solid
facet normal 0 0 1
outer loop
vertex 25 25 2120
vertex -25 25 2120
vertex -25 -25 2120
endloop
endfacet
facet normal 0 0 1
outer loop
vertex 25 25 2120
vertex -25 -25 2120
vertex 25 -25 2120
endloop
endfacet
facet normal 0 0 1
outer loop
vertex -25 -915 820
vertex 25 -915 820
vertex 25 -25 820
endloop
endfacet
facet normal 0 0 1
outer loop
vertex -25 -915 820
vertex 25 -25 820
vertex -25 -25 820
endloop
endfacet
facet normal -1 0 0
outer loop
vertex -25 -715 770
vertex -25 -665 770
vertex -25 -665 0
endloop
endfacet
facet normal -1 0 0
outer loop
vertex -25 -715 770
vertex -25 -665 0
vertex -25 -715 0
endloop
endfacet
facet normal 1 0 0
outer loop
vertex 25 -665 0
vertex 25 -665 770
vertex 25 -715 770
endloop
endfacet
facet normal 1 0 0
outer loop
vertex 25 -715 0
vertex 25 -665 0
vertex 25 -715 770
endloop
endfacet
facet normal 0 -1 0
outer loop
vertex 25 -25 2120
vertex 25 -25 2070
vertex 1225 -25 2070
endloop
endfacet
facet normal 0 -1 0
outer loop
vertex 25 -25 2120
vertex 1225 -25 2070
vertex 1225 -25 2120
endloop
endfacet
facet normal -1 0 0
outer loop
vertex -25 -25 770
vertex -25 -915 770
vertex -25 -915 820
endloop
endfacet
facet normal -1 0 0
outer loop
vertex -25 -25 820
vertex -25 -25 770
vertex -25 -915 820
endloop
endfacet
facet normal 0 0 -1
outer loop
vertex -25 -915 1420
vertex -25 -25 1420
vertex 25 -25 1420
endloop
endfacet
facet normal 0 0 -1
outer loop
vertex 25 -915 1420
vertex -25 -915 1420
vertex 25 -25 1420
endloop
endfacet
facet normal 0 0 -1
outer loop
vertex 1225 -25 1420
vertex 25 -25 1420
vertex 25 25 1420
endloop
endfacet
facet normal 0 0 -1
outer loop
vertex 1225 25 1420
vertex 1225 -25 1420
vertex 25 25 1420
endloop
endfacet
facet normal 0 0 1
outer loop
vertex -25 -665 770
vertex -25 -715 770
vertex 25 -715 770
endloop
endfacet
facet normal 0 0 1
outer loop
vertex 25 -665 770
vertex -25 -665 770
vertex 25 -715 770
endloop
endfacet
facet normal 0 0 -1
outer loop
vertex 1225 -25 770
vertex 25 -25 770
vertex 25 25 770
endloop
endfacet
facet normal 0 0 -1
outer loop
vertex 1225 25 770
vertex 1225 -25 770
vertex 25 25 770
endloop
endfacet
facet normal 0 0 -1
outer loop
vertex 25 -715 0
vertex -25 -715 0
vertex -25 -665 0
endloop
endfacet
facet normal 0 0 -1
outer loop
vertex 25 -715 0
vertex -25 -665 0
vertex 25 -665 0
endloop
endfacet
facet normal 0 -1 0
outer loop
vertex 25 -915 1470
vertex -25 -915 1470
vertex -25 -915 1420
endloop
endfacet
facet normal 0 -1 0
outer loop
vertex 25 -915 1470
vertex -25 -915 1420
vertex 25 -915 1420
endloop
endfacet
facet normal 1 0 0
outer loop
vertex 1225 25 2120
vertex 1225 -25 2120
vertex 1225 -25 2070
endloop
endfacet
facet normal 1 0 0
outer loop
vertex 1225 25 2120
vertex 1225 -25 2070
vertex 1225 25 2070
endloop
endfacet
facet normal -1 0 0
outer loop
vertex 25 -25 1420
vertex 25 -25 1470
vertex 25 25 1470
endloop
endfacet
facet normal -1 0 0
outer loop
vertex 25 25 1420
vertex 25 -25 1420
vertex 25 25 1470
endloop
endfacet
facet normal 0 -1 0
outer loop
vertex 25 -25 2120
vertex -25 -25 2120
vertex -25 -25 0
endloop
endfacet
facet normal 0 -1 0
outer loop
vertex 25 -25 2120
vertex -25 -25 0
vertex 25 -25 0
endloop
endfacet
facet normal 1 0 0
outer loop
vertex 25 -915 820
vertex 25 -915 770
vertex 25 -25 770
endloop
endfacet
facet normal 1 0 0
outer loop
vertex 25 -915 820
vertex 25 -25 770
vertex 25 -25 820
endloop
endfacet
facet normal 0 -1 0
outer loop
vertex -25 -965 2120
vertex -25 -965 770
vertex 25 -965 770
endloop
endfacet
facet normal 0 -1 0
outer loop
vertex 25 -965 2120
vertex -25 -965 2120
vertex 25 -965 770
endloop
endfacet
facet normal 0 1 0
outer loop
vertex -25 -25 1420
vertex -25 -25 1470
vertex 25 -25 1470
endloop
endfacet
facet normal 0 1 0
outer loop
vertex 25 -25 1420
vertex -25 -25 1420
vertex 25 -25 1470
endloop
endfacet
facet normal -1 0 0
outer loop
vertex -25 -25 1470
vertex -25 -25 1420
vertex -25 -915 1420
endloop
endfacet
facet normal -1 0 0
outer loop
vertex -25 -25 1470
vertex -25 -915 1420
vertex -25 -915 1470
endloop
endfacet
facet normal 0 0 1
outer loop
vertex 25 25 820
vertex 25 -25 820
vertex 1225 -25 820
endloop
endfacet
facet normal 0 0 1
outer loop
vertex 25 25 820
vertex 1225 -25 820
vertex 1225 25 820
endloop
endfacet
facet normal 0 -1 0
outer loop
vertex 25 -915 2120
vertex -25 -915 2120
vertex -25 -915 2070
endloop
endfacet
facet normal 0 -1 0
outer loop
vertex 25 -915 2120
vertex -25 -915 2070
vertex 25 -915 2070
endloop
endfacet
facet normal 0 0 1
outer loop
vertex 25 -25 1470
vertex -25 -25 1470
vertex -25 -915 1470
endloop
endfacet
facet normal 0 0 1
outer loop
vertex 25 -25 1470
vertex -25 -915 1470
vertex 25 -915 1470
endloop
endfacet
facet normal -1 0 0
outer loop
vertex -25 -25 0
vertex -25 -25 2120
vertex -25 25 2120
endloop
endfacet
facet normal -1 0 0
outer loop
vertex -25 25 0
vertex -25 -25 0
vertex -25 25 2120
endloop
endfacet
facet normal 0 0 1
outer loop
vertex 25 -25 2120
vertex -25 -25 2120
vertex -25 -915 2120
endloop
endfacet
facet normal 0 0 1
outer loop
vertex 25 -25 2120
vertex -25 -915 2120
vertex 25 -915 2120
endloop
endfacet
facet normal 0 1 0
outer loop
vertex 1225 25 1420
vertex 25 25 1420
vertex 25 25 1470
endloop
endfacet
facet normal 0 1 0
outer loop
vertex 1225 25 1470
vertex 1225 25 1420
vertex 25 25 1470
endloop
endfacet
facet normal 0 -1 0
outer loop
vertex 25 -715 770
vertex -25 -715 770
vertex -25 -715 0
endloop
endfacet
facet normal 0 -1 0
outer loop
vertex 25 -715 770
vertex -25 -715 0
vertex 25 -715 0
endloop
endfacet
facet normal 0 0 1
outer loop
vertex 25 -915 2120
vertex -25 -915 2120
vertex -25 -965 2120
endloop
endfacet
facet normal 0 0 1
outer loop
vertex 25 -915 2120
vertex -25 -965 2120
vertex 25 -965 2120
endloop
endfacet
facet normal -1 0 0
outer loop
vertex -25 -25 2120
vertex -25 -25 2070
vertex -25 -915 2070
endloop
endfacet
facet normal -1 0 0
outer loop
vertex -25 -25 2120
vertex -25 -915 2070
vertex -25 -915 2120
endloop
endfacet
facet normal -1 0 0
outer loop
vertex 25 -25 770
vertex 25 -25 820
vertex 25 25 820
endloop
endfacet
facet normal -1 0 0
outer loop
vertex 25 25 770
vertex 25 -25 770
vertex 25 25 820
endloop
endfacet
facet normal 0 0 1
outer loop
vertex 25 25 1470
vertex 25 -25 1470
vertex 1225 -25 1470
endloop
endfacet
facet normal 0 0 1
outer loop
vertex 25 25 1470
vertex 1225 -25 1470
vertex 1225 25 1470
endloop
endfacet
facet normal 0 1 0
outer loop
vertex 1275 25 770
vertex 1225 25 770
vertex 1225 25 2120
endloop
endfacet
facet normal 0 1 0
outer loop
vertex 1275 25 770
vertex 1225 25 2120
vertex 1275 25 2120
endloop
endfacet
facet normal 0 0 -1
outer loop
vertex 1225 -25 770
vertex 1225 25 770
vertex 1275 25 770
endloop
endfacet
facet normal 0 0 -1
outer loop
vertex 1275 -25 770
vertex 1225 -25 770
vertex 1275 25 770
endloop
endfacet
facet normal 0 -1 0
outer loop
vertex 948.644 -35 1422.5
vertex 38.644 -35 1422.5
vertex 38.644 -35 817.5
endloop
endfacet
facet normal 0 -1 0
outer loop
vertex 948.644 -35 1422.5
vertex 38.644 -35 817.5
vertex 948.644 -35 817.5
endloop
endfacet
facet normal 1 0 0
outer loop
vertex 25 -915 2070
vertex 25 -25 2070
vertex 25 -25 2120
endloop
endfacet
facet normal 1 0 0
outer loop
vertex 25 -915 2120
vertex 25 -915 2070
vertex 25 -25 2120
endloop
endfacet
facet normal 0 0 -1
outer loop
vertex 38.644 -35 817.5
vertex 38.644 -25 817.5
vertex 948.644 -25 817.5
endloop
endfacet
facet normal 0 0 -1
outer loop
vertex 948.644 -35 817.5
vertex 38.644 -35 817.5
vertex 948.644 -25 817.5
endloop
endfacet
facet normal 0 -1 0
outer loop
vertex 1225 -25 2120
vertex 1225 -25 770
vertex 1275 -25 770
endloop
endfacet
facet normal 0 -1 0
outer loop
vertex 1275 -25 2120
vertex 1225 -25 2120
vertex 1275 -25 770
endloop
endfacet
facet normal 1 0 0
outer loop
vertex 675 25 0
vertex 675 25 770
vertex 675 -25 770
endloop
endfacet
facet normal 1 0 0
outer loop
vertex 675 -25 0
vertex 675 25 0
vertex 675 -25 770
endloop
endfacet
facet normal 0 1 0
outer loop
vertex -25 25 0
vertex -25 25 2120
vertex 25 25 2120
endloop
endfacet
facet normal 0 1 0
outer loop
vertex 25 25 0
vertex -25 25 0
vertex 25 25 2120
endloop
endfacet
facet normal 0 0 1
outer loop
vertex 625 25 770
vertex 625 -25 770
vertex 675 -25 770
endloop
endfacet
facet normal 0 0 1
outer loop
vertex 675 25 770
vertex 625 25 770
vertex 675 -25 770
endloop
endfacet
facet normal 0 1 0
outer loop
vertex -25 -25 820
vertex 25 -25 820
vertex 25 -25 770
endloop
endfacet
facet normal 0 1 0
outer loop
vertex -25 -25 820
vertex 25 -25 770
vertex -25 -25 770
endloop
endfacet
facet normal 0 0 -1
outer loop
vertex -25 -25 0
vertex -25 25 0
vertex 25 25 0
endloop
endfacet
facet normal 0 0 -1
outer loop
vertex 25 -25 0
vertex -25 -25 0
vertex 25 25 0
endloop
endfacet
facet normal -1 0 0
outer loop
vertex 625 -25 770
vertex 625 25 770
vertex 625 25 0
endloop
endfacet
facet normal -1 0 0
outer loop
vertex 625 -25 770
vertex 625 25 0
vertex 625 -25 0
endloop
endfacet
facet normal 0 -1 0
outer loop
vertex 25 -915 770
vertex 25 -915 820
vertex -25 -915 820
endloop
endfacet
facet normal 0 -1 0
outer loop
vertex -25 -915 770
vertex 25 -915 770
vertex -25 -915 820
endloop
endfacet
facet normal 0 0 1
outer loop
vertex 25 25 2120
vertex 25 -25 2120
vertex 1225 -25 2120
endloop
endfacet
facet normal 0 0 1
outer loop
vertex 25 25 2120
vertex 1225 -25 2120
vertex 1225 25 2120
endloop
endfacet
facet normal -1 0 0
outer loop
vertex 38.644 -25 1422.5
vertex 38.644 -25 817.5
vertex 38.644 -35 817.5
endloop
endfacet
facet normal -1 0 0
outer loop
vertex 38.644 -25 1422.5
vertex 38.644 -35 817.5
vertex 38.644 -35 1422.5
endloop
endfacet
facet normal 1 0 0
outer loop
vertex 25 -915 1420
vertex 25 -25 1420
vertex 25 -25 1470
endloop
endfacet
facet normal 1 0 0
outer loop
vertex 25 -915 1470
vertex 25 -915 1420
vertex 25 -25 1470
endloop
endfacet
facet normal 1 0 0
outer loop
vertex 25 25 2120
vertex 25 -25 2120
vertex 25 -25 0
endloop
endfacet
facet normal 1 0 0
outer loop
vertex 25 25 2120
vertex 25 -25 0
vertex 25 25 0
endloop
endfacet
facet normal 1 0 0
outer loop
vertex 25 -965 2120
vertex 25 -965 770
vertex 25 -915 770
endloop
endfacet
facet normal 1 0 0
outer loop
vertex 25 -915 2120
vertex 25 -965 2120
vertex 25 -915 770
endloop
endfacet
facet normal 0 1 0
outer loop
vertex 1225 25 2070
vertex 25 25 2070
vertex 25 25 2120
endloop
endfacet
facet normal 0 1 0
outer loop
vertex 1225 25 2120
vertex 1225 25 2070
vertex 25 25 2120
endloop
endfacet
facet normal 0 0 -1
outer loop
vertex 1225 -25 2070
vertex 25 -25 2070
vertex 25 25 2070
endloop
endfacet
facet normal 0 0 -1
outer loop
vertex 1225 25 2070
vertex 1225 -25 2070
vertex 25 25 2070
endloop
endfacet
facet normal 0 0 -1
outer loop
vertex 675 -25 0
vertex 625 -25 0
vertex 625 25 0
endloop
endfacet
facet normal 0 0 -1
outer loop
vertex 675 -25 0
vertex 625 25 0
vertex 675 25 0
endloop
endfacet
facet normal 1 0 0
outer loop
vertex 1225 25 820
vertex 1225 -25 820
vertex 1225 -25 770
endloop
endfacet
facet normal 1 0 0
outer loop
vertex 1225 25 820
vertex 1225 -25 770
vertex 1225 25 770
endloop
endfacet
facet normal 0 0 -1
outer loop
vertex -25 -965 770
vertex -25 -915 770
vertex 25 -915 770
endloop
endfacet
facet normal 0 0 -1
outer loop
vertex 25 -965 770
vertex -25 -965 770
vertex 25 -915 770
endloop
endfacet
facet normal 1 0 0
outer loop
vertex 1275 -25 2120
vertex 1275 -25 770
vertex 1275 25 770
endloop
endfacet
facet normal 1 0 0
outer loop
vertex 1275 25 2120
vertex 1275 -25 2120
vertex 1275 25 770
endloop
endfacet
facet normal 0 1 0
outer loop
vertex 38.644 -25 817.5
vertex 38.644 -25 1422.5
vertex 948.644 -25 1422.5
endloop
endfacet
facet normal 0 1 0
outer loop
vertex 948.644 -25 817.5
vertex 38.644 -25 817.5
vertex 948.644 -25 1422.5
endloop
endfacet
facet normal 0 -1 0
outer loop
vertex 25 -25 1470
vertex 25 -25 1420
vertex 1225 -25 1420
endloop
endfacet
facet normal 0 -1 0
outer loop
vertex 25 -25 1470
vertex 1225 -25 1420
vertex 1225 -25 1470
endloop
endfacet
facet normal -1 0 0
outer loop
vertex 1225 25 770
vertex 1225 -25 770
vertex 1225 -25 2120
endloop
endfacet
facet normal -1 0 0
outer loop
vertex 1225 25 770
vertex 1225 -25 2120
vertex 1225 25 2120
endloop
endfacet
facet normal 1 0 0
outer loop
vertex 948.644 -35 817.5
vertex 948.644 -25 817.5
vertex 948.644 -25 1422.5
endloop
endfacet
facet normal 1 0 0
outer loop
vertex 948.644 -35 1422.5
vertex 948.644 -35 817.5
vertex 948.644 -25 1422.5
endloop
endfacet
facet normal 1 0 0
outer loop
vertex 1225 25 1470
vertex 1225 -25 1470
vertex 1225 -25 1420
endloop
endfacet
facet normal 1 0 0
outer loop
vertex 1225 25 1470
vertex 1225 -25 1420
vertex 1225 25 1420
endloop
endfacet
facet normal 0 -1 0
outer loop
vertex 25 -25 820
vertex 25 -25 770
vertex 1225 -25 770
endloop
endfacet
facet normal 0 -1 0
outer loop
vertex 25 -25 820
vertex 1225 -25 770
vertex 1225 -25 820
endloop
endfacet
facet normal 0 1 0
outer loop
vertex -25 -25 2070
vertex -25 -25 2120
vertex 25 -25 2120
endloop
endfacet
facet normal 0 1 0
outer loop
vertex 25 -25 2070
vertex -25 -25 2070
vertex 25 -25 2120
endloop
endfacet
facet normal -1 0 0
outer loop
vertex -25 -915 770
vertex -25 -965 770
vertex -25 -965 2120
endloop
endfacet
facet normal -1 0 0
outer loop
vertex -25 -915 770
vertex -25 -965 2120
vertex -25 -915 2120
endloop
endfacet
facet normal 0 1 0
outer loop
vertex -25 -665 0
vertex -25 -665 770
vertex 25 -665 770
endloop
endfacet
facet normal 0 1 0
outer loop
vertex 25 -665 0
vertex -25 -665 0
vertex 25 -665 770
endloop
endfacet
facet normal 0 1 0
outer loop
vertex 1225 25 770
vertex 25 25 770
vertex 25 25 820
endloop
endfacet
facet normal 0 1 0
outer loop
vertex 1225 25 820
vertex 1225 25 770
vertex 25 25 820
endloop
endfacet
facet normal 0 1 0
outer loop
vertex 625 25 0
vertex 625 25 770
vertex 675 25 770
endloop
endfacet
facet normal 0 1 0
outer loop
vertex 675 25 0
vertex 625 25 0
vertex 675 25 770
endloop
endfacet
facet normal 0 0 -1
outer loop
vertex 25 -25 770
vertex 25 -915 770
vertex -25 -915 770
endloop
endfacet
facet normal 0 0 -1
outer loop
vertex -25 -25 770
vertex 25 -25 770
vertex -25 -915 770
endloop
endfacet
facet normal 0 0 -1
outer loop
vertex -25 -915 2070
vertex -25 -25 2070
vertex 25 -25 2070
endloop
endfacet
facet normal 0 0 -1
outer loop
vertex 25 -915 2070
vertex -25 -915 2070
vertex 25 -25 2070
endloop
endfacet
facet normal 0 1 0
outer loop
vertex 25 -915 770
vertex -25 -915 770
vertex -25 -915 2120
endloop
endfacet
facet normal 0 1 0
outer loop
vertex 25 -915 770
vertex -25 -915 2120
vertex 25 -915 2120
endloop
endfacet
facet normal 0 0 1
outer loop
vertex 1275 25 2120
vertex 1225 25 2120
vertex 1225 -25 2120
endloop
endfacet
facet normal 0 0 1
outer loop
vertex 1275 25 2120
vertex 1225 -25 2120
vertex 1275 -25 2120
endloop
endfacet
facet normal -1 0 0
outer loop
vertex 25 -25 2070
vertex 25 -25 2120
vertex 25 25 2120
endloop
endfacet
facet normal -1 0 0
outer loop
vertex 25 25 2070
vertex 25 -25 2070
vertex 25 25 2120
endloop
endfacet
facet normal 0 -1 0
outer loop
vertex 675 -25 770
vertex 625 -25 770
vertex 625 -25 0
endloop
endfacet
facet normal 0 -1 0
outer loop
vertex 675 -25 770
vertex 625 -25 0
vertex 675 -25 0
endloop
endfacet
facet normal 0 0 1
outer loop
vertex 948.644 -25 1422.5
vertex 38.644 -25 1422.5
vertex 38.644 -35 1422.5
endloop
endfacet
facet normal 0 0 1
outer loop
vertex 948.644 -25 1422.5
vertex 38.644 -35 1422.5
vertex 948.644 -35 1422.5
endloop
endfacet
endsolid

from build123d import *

# Parameters (mm, degrees)
F0_W      = 50
F0_H      = 50
F1_DEPTH  = 2120
F2_W      = 50
F2_H      = 50
F3_DEPTH  = 890
F4_W      = 50
F4_H      = 50
F5_DEPTH  = 1350
F6_W      = 50
F6_H      = 50
F7_DEPTH  = 890
F8_W      = 50
F8_H      = 50
F9_DEPTH  = 1200
F10_W     = 50
F10_H     = 50
F11_DEPTH = 1350
F12_W     = 50
F12_H     = 50
F13_DEPTH = 1200
F14_W     = 50
F14_H     = 50
F15_DEPTH = 770
F16_W     = 50
F16_H     = 50
F17_DEPTH = 1200
F18_W     = 50
F18_H     = 50
F19_DEPTH = 890
F20_W     = 910
F20_H     = 605
F21_DEPTH = 10
F22_W     = 50
F22_H     = 50
F23_DEPTH = 770


with BuildPart() as f1:
    # F0 (on Top) → F1 (new body)
    with BuildSketch(Plane.XY):
        Rectangle(F0_W, F0_H)
    extrude(amount=F1_DEPTH)


with BuildPart() as f3:
    # F2 (on face) → F3 (new body)
    with BuildSketch(Plane.XZ.offset(25)):
        with Locations((0, 2095)):
            Rectangle(F2_W, F2_H)
    extrude(amount=F3_DEPTH)


with BuildPart() as f5:
    # F4 (on face) → F5 (new body)
    with BuildSketch(Plane.XY.offset(2120)):
        with Locations((0, -940)):
            Rectangle(F4_W, F4_H)
    extrude(amount=-F5_DEPTH)


with BuildPart() as f7:
    # F6 (on face) → F7 (new body, through all)
    with BuildSketch(Plane(origin=(0, -915, 0), x_dir=(-1, 0, 0), z_dir=(0, 1, 0))):
        with Locations((0, 795)):
            Rectangle(F6_W, F6_H)
    extrude(amount=F7_DEPTH)


with BuildPart() as f9:
    # F8 (on face) → F9 (new body)
    with BuildSketch(Plane.YZ.offset(25)):
        with Locations((0, 2095)):
            Rectangle(F8_W, F8_H)
    extrude(amount=F9_DEPTH)


with BuildPart() as f11:
    # F10 (on face) → F11 (new body, through all)
    with BuildSketch(Plane.XY.offset(2120)):
        with Locations((1250, 0)):
            Rectangle(F10_W, F10_H)
    extrude(amount=-F11_DEPTH)


with BuildPart() as f13:
    # F12 (on face) → F13 (new body, through all)
    with BuildSketch(Plane.YZ.offset(25)):
        with Locations((0, 795)):
            Rectangle(F12_W, F12_H)
    extrude(amount=F13_DEPTH)


with BuildPart() as f15:
    # F14 (on face) → F15 (new body, through all)
    with BuildSketch(Plane(origin=(0, 0, 770), x_dir=(1, 0, 0), z_dir=(0, 0, -1))):
        with Locations((0, 690)):
            Rectangle(F14_W, F14_H)
    extrude(amount=F15_DEPTH)


with BuildPart() as f17:
    # F16 (on face) → F17 (new body, through all)
    with BuildSketch(Plane.YZ.offset(25)):
        with Locations((0, 1445)):
            Rectangle(F16_W, F16_H)
    extrude(amount=F17_DEPTH)


with BuildPart() as f19:
    # F18 (on face) → F19 (new body, through all)
    with BuildSketch(Plane.XZ.offset(25)):
        with Locations((0, 1445)):
            Rectangle(F18_W, F18_H)
    extrude(amount=F19_DEPTH)


with BuildPart() as f21:
    # F20 (on face) → F21 (new body)
    with BuildSketch(Plane.XZ.offset(25)):
        with Locations((493.644080162, 1120)):
            Rectangle(F20_W, F20_H)
    extrude(amount=F21_DEPTH)


with BuildPart() as f23:
    # F22 (on face) → F23 (new body, through all)
    with BuildSketch(Plane(origin=(0, 0, 770), x_dir=(1, 0, 0), z_dir=(0, 0, -1))):
        with Locations((650, 0)):
            Rectangle(F22_W, F22_H)
    extrude(amount=F23_DEPTH)


solid = Compound([f1.part, f3.part, f5.part, f7.part, f9.part, f11.part, f13.part, f15.part, f17.part, f19.part, f21.part, f23.part])
